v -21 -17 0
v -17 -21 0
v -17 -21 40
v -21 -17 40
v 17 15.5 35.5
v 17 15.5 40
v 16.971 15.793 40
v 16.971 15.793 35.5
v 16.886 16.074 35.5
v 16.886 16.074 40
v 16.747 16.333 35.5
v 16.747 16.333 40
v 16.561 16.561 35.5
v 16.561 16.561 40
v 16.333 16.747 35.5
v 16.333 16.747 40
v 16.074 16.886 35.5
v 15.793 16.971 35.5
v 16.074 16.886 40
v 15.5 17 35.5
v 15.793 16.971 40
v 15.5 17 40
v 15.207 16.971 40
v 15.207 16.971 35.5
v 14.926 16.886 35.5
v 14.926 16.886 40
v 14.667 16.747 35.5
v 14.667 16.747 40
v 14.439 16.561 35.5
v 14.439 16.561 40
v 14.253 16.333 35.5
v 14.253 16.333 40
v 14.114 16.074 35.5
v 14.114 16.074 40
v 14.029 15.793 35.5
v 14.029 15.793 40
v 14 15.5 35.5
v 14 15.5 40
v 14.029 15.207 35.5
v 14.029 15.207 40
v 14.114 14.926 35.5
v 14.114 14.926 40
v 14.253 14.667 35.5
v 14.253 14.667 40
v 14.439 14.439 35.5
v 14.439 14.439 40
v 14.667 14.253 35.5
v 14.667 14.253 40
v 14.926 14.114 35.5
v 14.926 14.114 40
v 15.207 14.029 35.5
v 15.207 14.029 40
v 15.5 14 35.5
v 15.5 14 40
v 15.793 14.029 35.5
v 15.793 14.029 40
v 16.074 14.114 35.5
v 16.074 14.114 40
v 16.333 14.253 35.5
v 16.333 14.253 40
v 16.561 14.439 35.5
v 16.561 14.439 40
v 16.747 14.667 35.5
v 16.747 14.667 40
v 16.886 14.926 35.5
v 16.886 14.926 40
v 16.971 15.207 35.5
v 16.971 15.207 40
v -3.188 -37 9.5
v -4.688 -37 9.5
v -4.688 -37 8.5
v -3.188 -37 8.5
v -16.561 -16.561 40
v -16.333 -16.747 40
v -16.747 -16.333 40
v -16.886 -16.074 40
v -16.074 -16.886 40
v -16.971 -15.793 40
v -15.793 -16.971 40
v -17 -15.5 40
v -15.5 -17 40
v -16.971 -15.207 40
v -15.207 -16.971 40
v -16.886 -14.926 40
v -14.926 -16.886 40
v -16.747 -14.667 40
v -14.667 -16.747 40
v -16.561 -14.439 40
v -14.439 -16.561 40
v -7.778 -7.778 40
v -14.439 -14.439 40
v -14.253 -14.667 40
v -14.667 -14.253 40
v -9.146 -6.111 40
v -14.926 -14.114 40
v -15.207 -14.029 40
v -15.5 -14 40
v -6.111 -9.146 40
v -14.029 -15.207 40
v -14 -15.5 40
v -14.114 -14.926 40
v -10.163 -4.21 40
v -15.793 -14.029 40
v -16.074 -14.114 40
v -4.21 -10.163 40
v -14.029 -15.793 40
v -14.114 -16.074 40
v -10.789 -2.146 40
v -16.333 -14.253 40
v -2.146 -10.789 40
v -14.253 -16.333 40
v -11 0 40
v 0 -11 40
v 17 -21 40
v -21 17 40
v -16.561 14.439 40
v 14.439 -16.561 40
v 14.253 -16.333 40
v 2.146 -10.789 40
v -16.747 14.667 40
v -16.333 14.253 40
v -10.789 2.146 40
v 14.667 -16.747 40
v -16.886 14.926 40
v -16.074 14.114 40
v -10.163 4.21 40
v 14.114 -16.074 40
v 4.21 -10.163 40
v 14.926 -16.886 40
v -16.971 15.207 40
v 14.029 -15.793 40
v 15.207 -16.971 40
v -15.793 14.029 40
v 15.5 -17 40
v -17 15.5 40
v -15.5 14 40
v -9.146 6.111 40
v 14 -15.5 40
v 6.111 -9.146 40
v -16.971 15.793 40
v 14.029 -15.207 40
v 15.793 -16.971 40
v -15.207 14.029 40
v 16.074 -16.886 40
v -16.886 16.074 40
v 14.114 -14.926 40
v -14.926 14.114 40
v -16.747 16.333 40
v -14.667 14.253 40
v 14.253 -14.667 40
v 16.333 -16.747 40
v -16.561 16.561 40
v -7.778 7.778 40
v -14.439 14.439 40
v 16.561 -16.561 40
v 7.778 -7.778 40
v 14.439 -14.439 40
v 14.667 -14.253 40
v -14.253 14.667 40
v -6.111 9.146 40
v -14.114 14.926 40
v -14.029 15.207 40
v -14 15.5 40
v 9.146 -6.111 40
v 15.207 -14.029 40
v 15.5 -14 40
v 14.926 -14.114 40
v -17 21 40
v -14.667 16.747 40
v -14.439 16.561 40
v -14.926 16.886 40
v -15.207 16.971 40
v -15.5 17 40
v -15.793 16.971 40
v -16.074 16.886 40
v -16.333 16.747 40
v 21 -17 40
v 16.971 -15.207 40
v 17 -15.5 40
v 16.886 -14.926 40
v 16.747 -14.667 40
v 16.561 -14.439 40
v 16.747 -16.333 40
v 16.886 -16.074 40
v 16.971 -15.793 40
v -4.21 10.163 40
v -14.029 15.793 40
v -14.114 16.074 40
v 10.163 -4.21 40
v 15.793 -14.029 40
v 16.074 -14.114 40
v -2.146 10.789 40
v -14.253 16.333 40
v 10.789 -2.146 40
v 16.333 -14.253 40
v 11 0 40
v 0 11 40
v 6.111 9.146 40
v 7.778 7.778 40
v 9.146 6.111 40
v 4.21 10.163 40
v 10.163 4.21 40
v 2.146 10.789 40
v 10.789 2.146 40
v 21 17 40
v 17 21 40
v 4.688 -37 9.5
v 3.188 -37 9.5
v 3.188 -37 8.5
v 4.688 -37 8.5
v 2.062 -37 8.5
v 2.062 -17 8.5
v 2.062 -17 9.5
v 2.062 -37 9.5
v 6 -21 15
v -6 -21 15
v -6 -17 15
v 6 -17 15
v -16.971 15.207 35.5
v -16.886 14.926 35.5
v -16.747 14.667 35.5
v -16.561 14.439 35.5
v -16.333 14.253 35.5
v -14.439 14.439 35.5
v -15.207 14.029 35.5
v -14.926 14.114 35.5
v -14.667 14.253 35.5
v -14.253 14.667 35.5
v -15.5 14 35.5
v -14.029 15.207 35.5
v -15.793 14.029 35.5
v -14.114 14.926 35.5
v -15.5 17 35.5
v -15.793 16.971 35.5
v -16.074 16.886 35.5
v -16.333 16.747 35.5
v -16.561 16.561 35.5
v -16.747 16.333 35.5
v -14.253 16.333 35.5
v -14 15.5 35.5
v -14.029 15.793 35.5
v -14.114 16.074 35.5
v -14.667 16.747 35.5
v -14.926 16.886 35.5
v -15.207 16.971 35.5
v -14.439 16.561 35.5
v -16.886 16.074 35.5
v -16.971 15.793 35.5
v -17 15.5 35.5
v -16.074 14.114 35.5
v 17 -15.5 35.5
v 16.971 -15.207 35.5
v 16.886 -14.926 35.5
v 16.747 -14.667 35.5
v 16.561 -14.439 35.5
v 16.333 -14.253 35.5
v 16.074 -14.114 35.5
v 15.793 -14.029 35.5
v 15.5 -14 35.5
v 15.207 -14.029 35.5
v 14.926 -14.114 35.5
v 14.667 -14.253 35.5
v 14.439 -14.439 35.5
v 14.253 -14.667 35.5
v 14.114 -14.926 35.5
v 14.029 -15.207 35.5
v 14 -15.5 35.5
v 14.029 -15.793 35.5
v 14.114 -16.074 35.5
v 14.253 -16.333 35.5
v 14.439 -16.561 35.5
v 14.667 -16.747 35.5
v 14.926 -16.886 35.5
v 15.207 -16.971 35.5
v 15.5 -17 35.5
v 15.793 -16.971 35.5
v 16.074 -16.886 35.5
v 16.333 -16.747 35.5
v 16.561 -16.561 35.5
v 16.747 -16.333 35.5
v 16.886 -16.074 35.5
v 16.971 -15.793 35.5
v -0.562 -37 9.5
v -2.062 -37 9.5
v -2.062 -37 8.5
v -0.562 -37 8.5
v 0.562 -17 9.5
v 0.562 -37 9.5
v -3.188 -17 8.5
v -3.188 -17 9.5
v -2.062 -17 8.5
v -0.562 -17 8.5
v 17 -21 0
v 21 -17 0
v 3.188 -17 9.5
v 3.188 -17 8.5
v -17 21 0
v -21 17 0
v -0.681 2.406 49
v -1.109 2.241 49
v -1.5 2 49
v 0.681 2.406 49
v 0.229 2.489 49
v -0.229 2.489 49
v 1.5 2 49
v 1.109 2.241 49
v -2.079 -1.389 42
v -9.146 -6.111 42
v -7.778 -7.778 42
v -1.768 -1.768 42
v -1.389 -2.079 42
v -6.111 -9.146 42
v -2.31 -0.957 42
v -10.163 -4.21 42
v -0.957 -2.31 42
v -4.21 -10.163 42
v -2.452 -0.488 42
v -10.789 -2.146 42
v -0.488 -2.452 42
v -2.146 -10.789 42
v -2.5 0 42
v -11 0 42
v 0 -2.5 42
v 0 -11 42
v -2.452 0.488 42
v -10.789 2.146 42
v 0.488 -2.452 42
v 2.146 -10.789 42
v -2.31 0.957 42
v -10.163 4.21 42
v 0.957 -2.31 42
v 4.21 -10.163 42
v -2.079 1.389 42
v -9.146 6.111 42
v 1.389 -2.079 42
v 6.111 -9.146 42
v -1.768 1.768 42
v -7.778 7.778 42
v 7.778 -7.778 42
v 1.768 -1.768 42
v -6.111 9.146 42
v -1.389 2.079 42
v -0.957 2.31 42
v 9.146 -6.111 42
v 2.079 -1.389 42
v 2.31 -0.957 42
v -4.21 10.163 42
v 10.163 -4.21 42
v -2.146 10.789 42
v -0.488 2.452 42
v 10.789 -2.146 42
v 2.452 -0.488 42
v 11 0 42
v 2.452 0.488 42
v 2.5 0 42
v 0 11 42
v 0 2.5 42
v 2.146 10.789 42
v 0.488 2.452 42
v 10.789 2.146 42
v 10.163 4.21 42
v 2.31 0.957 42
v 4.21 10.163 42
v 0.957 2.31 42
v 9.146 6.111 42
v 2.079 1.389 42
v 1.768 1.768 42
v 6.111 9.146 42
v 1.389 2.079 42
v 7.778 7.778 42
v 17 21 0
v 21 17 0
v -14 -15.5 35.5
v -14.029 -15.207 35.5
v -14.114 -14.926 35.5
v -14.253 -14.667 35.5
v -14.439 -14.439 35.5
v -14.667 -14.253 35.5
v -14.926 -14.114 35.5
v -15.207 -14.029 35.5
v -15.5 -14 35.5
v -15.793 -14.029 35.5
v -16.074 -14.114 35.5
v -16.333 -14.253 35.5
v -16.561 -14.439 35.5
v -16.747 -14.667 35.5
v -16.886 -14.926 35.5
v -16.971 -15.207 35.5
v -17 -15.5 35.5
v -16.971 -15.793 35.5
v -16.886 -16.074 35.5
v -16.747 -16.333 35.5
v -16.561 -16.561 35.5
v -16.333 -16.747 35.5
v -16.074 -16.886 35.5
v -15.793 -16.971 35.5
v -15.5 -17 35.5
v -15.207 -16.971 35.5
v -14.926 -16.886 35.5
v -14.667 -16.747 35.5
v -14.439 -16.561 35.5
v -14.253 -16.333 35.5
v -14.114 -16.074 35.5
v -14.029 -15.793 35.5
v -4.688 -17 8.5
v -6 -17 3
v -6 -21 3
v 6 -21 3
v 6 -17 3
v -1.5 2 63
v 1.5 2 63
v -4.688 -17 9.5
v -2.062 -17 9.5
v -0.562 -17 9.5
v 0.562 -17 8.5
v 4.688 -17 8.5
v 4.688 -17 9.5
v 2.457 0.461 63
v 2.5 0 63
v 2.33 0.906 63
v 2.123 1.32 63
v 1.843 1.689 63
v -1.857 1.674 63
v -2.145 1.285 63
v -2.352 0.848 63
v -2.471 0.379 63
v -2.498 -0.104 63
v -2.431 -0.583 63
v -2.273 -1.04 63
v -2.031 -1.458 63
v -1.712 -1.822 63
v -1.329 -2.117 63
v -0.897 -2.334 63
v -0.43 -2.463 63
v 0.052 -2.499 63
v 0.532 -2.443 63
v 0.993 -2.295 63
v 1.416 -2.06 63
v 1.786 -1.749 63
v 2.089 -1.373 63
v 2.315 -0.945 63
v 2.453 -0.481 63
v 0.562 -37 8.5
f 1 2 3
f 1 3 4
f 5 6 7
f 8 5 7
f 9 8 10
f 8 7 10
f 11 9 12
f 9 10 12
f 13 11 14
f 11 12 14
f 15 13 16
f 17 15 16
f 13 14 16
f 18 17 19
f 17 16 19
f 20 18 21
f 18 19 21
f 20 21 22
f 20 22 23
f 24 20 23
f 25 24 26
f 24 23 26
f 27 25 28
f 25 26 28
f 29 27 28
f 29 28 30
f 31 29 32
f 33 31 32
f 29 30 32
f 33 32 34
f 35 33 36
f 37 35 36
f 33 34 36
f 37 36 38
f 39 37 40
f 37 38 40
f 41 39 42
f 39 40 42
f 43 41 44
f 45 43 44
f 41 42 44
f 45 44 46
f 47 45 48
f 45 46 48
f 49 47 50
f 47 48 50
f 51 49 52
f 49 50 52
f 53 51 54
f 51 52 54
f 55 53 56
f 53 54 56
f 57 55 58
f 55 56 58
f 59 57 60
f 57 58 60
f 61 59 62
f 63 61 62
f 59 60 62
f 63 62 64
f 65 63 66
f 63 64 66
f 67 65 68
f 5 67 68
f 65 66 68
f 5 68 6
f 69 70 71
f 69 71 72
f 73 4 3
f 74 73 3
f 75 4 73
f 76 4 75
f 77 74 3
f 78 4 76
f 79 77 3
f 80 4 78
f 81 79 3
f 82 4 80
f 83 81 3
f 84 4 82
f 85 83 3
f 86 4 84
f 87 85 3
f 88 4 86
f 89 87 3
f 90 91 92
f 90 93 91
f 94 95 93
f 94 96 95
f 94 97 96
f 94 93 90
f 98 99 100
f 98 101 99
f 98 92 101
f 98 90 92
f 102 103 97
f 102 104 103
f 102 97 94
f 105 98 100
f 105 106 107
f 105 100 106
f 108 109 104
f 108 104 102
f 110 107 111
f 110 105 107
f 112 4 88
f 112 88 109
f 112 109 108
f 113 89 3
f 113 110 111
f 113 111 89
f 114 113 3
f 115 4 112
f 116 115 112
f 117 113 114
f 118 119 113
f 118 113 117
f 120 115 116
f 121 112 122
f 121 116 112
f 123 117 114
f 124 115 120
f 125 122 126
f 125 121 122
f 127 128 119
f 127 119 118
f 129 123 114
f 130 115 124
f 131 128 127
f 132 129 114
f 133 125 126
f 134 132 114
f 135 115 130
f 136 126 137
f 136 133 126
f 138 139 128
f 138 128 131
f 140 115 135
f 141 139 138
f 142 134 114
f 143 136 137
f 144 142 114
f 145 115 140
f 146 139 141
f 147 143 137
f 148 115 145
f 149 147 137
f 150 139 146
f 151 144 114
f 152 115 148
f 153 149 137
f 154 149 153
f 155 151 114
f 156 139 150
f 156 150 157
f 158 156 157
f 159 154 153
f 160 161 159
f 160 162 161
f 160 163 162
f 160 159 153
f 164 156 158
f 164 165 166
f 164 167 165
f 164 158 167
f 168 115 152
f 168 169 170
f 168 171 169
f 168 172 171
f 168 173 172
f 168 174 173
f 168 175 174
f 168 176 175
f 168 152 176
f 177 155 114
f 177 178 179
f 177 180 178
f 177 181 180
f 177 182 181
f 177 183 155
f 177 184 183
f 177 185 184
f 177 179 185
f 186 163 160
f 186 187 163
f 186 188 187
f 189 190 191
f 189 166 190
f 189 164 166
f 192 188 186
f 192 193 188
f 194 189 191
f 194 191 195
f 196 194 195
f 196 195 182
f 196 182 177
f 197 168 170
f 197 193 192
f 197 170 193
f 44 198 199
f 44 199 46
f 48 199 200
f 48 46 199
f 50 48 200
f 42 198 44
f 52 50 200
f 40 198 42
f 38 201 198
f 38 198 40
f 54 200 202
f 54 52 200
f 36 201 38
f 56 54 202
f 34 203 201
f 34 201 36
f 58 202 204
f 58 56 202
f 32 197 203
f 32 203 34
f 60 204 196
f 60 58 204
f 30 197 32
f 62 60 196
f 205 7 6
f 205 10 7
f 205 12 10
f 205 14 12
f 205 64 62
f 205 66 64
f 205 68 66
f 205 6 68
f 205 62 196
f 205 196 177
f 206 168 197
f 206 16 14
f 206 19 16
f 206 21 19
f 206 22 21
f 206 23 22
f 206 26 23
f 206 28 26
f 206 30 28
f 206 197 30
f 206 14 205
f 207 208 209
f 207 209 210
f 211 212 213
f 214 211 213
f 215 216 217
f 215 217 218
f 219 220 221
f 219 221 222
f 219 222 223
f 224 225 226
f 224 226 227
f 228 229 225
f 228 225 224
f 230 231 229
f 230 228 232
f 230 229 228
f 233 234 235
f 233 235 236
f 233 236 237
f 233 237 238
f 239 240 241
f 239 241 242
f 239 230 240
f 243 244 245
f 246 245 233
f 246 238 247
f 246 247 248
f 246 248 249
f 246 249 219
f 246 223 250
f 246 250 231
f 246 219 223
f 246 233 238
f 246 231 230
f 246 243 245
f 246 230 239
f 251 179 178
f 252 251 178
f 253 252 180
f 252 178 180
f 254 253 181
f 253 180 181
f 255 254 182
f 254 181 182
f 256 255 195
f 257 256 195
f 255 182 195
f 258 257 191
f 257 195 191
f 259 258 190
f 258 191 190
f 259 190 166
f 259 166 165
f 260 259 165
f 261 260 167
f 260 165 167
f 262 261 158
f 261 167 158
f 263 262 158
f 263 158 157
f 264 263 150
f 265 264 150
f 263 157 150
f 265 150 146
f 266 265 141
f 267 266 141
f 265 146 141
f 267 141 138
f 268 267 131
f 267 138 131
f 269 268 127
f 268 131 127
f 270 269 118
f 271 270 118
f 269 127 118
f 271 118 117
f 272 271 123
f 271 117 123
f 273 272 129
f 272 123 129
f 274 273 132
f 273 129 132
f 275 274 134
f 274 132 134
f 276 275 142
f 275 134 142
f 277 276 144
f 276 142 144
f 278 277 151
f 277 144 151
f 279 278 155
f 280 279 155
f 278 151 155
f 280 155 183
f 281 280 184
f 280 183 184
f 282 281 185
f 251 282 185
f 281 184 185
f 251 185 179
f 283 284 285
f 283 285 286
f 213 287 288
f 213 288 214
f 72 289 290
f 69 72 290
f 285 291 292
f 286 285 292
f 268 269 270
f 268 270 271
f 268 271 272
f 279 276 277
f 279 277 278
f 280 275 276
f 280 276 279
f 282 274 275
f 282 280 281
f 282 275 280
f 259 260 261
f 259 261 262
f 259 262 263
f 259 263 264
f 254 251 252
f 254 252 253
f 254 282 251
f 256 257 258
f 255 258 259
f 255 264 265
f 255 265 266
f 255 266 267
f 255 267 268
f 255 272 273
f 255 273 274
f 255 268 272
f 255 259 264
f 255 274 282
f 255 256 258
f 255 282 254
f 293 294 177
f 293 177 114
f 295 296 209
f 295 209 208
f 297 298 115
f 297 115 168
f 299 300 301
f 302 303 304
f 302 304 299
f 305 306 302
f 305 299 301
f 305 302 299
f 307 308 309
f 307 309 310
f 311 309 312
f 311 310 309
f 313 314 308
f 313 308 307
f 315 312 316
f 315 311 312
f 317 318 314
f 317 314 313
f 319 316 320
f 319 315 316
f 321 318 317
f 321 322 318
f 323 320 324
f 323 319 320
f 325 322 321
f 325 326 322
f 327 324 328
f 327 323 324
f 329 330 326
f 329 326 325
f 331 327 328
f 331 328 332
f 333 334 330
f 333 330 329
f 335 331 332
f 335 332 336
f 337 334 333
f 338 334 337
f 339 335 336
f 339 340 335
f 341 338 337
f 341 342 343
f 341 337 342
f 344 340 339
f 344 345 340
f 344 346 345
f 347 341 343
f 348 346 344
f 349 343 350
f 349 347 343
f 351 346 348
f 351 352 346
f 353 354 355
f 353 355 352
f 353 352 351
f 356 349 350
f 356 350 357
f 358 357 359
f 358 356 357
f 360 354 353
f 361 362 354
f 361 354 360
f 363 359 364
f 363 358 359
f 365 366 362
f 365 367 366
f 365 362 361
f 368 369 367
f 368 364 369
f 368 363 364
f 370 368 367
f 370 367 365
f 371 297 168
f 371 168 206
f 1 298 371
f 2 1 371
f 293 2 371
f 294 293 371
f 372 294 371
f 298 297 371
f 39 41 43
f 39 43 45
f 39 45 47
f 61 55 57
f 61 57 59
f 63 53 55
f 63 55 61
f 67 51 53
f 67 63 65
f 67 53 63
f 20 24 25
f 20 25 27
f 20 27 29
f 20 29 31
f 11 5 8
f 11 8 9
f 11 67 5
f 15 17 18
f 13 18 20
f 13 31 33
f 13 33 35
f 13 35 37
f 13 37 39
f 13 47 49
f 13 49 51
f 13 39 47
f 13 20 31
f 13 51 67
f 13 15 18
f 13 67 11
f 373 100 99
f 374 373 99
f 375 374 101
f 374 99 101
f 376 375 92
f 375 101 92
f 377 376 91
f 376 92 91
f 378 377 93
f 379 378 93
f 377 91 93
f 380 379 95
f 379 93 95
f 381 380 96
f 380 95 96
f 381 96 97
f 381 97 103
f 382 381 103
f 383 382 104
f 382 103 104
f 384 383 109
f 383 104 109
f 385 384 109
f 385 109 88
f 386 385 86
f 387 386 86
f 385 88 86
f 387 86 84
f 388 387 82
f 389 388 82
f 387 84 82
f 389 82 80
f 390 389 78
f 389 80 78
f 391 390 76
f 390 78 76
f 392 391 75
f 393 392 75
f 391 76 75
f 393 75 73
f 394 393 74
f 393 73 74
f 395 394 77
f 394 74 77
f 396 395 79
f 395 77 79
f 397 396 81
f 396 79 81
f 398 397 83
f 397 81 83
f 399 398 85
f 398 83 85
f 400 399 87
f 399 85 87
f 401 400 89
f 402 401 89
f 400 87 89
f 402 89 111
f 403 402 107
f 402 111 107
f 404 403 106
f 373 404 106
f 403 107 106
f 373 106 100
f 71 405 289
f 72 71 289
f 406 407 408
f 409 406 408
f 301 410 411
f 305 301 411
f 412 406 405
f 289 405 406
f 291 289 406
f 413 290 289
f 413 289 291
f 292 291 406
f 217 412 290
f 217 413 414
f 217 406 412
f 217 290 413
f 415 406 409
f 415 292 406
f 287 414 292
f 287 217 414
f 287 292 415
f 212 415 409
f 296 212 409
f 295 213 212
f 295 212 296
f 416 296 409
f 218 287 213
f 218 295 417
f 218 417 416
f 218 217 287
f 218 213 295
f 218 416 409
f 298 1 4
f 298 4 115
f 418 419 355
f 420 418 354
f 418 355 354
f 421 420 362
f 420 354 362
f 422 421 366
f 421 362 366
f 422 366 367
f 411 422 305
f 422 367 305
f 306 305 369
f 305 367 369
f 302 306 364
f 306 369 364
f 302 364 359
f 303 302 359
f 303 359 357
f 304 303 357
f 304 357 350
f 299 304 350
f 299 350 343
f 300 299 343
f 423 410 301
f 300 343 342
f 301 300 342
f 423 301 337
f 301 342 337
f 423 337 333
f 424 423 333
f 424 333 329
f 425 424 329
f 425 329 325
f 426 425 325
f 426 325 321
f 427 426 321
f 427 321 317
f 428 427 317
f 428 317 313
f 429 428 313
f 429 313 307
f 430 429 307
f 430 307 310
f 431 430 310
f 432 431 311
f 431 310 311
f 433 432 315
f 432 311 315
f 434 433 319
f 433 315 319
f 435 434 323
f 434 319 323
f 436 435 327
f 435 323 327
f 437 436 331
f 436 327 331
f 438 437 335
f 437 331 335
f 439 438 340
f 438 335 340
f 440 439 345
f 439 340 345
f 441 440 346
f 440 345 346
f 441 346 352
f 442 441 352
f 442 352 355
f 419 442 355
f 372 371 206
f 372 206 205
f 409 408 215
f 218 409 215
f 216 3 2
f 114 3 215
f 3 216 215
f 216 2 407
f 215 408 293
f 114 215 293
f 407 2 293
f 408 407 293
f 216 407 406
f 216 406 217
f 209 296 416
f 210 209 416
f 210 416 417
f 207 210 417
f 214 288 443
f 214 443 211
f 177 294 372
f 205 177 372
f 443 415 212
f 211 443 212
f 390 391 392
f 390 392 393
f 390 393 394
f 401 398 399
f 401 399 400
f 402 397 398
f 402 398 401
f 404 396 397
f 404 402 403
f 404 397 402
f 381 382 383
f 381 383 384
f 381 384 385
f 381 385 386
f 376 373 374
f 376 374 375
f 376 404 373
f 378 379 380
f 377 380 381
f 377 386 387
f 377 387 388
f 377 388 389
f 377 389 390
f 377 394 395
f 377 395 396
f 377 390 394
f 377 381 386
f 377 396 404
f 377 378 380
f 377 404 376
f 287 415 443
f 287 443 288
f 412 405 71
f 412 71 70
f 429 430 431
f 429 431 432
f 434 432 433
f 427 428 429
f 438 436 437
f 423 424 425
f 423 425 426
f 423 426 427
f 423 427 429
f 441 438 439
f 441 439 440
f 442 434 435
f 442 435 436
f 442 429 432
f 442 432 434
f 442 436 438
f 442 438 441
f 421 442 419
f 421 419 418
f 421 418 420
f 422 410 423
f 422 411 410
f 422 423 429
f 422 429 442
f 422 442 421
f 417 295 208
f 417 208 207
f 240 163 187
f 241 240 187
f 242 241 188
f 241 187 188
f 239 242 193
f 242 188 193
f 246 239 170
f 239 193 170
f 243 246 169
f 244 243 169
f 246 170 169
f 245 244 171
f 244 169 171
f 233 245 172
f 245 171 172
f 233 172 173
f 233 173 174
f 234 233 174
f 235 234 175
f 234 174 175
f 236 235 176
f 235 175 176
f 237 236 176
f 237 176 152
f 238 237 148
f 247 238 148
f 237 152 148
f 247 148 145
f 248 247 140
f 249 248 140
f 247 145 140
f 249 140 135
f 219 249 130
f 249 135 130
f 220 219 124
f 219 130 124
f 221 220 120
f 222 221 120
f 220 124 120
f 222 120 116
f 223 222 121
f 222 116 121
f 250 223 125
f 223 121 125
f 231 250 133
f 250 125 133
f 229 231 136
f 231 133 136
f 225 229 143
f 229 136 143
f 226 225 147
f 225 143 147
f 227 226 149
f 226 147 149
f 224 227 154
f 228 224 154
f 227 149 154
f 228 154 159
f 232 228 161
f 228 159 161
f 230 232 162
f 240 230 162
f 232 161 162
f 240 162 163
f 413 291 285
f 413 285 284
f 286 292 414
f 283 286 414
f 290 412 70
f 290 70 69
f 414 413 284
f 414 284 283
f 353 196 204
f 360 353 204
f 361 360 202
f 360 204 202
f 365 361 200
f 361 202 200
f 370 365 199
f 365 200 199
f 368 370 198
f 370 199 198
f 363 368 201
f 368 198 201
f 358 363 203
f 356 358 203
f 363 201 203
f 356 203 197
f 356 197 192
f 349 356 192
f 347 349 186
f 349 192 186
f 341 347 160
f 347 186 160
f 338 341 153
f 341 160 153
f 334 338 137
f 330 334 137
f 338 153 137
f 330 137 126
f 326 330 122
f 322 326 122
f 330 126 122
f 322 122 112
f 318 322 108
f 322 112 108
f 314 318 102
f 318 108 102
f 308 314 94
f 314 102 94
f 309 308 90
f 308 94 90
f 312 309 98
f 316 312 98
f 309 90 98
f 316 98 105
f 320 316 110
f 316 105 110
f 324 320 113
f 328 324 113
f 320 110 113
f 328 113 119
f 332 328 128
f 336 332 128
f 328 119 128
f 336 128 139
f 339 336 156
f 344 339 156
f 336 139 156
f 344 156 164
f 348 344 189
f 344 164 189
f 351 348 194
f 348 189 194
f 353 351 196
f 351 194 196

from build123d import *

# Parameters (mm, degrees)
F0_W      = 42
F0_H      = 42
F1_DEPTH  = 40
F2_R      = 1.5
F3_DEPTH  = 4.5
F5_DEPTH  = 40.001
F6_R      = 11
F7_DEPTH  = 2
F8_R      = 2.5
F9_DEPTH  = 21
F11_DEPTH = 14
F12_W     = 12
F12_H     = 12
F13_DEPTH = 4
F14_W     = 1.5
F14_H     = 1
F15_DEPTH = 20


with BuildPart() as f1:
    # F0 (on Top) → F1 (new body)
    with BuildSketch(Plane.XY):
        Rectangle(F0_W, F0_H)
    extrude(amount=F1_DEPTH)

    # F2 (on face) → F3 (cut)
    with BuildSketch(Plane.XY.offset(40)):
        with Locations((15.5, 15.5)):
            Circle(F2_R)
        with Locations((15.5, -15.5)):
            Circle(F2_R)
        with Locations((-15.5, -15.5)):
            Circle(F2_R)
        with Locations((-15.5, 15.5)):
            Circle(F2_R)
    extrude(amount=-F3_DEPTH, mode=Mode.SUBTRACT)

    # F4 (on face) → F5 (cut, through all)
    with BuildSketch(Plane.XY.offset(40)):
        Polygon((17, 21), (21, 17), (21, 21), align=None)
        Polygon((17, -21), (21, -21), (21, -17), align=None)
        Polygon((-17, -21), (-21, -17), (-21, -21), align=None)
        Polygon((-17, 21), (-21, 21), (-21, 17), align=None)
    extrude(amount=-F5_DEPTH, mode=Mode.SUBTRACT)

    # F6 (on face) → F7 (join)
    with BuildSketch(Plane.XY.offset(40)):
        Circle(F6_R)
    extrude(amount=F7_DEPTH)

    # F8 (on face) → F9 (join)
    with BuildSketch(Plane.XY.offset(42)):
        Circle(F8_R)
    extrude(amount=F9_DEPTH)

    # F10 (on face) → F11 (cut)
    with BuildSketch(Plane.XY.offset(63)):
        with BuildLine():
            Line((-1.5, 2), (1.5, 2))
            ThreePointArc((1.5, 2), (0, 2.5), (-1.5, 2))
        make_face()
    extrude(amount=-F11_DEPTH, mode=Mode.SUBTRACT)

    # F12 (on face) → F13 (cut)
    with BuildSketch(Plane.XZ.offset(21)):
        with Locations((0, 9)):
            Rectangle(F12_W, F12_H)
    extrude(amount=-F13_DEPTH, mode=Mode.SUBTRACT)

    # F14 (on face) → F15 (join)
    with BuildSketch(Plane.XZ.offset(17)):
        with Locations((-3.9375, 9)):
            Rectangle(F14_W, F14_H)
        with Locations((-1.3125, 9)):
            Rectangle(F14_W, F14_H)
        with Locations((1.3125, 9)):
            Rectangle(F14_W, F14_H)
        with Locations((3.9375, 9)):
            Rectangle(F14_W, F14_H)
    extrude(amount=F15_DEPTH)


solid = f1.part
